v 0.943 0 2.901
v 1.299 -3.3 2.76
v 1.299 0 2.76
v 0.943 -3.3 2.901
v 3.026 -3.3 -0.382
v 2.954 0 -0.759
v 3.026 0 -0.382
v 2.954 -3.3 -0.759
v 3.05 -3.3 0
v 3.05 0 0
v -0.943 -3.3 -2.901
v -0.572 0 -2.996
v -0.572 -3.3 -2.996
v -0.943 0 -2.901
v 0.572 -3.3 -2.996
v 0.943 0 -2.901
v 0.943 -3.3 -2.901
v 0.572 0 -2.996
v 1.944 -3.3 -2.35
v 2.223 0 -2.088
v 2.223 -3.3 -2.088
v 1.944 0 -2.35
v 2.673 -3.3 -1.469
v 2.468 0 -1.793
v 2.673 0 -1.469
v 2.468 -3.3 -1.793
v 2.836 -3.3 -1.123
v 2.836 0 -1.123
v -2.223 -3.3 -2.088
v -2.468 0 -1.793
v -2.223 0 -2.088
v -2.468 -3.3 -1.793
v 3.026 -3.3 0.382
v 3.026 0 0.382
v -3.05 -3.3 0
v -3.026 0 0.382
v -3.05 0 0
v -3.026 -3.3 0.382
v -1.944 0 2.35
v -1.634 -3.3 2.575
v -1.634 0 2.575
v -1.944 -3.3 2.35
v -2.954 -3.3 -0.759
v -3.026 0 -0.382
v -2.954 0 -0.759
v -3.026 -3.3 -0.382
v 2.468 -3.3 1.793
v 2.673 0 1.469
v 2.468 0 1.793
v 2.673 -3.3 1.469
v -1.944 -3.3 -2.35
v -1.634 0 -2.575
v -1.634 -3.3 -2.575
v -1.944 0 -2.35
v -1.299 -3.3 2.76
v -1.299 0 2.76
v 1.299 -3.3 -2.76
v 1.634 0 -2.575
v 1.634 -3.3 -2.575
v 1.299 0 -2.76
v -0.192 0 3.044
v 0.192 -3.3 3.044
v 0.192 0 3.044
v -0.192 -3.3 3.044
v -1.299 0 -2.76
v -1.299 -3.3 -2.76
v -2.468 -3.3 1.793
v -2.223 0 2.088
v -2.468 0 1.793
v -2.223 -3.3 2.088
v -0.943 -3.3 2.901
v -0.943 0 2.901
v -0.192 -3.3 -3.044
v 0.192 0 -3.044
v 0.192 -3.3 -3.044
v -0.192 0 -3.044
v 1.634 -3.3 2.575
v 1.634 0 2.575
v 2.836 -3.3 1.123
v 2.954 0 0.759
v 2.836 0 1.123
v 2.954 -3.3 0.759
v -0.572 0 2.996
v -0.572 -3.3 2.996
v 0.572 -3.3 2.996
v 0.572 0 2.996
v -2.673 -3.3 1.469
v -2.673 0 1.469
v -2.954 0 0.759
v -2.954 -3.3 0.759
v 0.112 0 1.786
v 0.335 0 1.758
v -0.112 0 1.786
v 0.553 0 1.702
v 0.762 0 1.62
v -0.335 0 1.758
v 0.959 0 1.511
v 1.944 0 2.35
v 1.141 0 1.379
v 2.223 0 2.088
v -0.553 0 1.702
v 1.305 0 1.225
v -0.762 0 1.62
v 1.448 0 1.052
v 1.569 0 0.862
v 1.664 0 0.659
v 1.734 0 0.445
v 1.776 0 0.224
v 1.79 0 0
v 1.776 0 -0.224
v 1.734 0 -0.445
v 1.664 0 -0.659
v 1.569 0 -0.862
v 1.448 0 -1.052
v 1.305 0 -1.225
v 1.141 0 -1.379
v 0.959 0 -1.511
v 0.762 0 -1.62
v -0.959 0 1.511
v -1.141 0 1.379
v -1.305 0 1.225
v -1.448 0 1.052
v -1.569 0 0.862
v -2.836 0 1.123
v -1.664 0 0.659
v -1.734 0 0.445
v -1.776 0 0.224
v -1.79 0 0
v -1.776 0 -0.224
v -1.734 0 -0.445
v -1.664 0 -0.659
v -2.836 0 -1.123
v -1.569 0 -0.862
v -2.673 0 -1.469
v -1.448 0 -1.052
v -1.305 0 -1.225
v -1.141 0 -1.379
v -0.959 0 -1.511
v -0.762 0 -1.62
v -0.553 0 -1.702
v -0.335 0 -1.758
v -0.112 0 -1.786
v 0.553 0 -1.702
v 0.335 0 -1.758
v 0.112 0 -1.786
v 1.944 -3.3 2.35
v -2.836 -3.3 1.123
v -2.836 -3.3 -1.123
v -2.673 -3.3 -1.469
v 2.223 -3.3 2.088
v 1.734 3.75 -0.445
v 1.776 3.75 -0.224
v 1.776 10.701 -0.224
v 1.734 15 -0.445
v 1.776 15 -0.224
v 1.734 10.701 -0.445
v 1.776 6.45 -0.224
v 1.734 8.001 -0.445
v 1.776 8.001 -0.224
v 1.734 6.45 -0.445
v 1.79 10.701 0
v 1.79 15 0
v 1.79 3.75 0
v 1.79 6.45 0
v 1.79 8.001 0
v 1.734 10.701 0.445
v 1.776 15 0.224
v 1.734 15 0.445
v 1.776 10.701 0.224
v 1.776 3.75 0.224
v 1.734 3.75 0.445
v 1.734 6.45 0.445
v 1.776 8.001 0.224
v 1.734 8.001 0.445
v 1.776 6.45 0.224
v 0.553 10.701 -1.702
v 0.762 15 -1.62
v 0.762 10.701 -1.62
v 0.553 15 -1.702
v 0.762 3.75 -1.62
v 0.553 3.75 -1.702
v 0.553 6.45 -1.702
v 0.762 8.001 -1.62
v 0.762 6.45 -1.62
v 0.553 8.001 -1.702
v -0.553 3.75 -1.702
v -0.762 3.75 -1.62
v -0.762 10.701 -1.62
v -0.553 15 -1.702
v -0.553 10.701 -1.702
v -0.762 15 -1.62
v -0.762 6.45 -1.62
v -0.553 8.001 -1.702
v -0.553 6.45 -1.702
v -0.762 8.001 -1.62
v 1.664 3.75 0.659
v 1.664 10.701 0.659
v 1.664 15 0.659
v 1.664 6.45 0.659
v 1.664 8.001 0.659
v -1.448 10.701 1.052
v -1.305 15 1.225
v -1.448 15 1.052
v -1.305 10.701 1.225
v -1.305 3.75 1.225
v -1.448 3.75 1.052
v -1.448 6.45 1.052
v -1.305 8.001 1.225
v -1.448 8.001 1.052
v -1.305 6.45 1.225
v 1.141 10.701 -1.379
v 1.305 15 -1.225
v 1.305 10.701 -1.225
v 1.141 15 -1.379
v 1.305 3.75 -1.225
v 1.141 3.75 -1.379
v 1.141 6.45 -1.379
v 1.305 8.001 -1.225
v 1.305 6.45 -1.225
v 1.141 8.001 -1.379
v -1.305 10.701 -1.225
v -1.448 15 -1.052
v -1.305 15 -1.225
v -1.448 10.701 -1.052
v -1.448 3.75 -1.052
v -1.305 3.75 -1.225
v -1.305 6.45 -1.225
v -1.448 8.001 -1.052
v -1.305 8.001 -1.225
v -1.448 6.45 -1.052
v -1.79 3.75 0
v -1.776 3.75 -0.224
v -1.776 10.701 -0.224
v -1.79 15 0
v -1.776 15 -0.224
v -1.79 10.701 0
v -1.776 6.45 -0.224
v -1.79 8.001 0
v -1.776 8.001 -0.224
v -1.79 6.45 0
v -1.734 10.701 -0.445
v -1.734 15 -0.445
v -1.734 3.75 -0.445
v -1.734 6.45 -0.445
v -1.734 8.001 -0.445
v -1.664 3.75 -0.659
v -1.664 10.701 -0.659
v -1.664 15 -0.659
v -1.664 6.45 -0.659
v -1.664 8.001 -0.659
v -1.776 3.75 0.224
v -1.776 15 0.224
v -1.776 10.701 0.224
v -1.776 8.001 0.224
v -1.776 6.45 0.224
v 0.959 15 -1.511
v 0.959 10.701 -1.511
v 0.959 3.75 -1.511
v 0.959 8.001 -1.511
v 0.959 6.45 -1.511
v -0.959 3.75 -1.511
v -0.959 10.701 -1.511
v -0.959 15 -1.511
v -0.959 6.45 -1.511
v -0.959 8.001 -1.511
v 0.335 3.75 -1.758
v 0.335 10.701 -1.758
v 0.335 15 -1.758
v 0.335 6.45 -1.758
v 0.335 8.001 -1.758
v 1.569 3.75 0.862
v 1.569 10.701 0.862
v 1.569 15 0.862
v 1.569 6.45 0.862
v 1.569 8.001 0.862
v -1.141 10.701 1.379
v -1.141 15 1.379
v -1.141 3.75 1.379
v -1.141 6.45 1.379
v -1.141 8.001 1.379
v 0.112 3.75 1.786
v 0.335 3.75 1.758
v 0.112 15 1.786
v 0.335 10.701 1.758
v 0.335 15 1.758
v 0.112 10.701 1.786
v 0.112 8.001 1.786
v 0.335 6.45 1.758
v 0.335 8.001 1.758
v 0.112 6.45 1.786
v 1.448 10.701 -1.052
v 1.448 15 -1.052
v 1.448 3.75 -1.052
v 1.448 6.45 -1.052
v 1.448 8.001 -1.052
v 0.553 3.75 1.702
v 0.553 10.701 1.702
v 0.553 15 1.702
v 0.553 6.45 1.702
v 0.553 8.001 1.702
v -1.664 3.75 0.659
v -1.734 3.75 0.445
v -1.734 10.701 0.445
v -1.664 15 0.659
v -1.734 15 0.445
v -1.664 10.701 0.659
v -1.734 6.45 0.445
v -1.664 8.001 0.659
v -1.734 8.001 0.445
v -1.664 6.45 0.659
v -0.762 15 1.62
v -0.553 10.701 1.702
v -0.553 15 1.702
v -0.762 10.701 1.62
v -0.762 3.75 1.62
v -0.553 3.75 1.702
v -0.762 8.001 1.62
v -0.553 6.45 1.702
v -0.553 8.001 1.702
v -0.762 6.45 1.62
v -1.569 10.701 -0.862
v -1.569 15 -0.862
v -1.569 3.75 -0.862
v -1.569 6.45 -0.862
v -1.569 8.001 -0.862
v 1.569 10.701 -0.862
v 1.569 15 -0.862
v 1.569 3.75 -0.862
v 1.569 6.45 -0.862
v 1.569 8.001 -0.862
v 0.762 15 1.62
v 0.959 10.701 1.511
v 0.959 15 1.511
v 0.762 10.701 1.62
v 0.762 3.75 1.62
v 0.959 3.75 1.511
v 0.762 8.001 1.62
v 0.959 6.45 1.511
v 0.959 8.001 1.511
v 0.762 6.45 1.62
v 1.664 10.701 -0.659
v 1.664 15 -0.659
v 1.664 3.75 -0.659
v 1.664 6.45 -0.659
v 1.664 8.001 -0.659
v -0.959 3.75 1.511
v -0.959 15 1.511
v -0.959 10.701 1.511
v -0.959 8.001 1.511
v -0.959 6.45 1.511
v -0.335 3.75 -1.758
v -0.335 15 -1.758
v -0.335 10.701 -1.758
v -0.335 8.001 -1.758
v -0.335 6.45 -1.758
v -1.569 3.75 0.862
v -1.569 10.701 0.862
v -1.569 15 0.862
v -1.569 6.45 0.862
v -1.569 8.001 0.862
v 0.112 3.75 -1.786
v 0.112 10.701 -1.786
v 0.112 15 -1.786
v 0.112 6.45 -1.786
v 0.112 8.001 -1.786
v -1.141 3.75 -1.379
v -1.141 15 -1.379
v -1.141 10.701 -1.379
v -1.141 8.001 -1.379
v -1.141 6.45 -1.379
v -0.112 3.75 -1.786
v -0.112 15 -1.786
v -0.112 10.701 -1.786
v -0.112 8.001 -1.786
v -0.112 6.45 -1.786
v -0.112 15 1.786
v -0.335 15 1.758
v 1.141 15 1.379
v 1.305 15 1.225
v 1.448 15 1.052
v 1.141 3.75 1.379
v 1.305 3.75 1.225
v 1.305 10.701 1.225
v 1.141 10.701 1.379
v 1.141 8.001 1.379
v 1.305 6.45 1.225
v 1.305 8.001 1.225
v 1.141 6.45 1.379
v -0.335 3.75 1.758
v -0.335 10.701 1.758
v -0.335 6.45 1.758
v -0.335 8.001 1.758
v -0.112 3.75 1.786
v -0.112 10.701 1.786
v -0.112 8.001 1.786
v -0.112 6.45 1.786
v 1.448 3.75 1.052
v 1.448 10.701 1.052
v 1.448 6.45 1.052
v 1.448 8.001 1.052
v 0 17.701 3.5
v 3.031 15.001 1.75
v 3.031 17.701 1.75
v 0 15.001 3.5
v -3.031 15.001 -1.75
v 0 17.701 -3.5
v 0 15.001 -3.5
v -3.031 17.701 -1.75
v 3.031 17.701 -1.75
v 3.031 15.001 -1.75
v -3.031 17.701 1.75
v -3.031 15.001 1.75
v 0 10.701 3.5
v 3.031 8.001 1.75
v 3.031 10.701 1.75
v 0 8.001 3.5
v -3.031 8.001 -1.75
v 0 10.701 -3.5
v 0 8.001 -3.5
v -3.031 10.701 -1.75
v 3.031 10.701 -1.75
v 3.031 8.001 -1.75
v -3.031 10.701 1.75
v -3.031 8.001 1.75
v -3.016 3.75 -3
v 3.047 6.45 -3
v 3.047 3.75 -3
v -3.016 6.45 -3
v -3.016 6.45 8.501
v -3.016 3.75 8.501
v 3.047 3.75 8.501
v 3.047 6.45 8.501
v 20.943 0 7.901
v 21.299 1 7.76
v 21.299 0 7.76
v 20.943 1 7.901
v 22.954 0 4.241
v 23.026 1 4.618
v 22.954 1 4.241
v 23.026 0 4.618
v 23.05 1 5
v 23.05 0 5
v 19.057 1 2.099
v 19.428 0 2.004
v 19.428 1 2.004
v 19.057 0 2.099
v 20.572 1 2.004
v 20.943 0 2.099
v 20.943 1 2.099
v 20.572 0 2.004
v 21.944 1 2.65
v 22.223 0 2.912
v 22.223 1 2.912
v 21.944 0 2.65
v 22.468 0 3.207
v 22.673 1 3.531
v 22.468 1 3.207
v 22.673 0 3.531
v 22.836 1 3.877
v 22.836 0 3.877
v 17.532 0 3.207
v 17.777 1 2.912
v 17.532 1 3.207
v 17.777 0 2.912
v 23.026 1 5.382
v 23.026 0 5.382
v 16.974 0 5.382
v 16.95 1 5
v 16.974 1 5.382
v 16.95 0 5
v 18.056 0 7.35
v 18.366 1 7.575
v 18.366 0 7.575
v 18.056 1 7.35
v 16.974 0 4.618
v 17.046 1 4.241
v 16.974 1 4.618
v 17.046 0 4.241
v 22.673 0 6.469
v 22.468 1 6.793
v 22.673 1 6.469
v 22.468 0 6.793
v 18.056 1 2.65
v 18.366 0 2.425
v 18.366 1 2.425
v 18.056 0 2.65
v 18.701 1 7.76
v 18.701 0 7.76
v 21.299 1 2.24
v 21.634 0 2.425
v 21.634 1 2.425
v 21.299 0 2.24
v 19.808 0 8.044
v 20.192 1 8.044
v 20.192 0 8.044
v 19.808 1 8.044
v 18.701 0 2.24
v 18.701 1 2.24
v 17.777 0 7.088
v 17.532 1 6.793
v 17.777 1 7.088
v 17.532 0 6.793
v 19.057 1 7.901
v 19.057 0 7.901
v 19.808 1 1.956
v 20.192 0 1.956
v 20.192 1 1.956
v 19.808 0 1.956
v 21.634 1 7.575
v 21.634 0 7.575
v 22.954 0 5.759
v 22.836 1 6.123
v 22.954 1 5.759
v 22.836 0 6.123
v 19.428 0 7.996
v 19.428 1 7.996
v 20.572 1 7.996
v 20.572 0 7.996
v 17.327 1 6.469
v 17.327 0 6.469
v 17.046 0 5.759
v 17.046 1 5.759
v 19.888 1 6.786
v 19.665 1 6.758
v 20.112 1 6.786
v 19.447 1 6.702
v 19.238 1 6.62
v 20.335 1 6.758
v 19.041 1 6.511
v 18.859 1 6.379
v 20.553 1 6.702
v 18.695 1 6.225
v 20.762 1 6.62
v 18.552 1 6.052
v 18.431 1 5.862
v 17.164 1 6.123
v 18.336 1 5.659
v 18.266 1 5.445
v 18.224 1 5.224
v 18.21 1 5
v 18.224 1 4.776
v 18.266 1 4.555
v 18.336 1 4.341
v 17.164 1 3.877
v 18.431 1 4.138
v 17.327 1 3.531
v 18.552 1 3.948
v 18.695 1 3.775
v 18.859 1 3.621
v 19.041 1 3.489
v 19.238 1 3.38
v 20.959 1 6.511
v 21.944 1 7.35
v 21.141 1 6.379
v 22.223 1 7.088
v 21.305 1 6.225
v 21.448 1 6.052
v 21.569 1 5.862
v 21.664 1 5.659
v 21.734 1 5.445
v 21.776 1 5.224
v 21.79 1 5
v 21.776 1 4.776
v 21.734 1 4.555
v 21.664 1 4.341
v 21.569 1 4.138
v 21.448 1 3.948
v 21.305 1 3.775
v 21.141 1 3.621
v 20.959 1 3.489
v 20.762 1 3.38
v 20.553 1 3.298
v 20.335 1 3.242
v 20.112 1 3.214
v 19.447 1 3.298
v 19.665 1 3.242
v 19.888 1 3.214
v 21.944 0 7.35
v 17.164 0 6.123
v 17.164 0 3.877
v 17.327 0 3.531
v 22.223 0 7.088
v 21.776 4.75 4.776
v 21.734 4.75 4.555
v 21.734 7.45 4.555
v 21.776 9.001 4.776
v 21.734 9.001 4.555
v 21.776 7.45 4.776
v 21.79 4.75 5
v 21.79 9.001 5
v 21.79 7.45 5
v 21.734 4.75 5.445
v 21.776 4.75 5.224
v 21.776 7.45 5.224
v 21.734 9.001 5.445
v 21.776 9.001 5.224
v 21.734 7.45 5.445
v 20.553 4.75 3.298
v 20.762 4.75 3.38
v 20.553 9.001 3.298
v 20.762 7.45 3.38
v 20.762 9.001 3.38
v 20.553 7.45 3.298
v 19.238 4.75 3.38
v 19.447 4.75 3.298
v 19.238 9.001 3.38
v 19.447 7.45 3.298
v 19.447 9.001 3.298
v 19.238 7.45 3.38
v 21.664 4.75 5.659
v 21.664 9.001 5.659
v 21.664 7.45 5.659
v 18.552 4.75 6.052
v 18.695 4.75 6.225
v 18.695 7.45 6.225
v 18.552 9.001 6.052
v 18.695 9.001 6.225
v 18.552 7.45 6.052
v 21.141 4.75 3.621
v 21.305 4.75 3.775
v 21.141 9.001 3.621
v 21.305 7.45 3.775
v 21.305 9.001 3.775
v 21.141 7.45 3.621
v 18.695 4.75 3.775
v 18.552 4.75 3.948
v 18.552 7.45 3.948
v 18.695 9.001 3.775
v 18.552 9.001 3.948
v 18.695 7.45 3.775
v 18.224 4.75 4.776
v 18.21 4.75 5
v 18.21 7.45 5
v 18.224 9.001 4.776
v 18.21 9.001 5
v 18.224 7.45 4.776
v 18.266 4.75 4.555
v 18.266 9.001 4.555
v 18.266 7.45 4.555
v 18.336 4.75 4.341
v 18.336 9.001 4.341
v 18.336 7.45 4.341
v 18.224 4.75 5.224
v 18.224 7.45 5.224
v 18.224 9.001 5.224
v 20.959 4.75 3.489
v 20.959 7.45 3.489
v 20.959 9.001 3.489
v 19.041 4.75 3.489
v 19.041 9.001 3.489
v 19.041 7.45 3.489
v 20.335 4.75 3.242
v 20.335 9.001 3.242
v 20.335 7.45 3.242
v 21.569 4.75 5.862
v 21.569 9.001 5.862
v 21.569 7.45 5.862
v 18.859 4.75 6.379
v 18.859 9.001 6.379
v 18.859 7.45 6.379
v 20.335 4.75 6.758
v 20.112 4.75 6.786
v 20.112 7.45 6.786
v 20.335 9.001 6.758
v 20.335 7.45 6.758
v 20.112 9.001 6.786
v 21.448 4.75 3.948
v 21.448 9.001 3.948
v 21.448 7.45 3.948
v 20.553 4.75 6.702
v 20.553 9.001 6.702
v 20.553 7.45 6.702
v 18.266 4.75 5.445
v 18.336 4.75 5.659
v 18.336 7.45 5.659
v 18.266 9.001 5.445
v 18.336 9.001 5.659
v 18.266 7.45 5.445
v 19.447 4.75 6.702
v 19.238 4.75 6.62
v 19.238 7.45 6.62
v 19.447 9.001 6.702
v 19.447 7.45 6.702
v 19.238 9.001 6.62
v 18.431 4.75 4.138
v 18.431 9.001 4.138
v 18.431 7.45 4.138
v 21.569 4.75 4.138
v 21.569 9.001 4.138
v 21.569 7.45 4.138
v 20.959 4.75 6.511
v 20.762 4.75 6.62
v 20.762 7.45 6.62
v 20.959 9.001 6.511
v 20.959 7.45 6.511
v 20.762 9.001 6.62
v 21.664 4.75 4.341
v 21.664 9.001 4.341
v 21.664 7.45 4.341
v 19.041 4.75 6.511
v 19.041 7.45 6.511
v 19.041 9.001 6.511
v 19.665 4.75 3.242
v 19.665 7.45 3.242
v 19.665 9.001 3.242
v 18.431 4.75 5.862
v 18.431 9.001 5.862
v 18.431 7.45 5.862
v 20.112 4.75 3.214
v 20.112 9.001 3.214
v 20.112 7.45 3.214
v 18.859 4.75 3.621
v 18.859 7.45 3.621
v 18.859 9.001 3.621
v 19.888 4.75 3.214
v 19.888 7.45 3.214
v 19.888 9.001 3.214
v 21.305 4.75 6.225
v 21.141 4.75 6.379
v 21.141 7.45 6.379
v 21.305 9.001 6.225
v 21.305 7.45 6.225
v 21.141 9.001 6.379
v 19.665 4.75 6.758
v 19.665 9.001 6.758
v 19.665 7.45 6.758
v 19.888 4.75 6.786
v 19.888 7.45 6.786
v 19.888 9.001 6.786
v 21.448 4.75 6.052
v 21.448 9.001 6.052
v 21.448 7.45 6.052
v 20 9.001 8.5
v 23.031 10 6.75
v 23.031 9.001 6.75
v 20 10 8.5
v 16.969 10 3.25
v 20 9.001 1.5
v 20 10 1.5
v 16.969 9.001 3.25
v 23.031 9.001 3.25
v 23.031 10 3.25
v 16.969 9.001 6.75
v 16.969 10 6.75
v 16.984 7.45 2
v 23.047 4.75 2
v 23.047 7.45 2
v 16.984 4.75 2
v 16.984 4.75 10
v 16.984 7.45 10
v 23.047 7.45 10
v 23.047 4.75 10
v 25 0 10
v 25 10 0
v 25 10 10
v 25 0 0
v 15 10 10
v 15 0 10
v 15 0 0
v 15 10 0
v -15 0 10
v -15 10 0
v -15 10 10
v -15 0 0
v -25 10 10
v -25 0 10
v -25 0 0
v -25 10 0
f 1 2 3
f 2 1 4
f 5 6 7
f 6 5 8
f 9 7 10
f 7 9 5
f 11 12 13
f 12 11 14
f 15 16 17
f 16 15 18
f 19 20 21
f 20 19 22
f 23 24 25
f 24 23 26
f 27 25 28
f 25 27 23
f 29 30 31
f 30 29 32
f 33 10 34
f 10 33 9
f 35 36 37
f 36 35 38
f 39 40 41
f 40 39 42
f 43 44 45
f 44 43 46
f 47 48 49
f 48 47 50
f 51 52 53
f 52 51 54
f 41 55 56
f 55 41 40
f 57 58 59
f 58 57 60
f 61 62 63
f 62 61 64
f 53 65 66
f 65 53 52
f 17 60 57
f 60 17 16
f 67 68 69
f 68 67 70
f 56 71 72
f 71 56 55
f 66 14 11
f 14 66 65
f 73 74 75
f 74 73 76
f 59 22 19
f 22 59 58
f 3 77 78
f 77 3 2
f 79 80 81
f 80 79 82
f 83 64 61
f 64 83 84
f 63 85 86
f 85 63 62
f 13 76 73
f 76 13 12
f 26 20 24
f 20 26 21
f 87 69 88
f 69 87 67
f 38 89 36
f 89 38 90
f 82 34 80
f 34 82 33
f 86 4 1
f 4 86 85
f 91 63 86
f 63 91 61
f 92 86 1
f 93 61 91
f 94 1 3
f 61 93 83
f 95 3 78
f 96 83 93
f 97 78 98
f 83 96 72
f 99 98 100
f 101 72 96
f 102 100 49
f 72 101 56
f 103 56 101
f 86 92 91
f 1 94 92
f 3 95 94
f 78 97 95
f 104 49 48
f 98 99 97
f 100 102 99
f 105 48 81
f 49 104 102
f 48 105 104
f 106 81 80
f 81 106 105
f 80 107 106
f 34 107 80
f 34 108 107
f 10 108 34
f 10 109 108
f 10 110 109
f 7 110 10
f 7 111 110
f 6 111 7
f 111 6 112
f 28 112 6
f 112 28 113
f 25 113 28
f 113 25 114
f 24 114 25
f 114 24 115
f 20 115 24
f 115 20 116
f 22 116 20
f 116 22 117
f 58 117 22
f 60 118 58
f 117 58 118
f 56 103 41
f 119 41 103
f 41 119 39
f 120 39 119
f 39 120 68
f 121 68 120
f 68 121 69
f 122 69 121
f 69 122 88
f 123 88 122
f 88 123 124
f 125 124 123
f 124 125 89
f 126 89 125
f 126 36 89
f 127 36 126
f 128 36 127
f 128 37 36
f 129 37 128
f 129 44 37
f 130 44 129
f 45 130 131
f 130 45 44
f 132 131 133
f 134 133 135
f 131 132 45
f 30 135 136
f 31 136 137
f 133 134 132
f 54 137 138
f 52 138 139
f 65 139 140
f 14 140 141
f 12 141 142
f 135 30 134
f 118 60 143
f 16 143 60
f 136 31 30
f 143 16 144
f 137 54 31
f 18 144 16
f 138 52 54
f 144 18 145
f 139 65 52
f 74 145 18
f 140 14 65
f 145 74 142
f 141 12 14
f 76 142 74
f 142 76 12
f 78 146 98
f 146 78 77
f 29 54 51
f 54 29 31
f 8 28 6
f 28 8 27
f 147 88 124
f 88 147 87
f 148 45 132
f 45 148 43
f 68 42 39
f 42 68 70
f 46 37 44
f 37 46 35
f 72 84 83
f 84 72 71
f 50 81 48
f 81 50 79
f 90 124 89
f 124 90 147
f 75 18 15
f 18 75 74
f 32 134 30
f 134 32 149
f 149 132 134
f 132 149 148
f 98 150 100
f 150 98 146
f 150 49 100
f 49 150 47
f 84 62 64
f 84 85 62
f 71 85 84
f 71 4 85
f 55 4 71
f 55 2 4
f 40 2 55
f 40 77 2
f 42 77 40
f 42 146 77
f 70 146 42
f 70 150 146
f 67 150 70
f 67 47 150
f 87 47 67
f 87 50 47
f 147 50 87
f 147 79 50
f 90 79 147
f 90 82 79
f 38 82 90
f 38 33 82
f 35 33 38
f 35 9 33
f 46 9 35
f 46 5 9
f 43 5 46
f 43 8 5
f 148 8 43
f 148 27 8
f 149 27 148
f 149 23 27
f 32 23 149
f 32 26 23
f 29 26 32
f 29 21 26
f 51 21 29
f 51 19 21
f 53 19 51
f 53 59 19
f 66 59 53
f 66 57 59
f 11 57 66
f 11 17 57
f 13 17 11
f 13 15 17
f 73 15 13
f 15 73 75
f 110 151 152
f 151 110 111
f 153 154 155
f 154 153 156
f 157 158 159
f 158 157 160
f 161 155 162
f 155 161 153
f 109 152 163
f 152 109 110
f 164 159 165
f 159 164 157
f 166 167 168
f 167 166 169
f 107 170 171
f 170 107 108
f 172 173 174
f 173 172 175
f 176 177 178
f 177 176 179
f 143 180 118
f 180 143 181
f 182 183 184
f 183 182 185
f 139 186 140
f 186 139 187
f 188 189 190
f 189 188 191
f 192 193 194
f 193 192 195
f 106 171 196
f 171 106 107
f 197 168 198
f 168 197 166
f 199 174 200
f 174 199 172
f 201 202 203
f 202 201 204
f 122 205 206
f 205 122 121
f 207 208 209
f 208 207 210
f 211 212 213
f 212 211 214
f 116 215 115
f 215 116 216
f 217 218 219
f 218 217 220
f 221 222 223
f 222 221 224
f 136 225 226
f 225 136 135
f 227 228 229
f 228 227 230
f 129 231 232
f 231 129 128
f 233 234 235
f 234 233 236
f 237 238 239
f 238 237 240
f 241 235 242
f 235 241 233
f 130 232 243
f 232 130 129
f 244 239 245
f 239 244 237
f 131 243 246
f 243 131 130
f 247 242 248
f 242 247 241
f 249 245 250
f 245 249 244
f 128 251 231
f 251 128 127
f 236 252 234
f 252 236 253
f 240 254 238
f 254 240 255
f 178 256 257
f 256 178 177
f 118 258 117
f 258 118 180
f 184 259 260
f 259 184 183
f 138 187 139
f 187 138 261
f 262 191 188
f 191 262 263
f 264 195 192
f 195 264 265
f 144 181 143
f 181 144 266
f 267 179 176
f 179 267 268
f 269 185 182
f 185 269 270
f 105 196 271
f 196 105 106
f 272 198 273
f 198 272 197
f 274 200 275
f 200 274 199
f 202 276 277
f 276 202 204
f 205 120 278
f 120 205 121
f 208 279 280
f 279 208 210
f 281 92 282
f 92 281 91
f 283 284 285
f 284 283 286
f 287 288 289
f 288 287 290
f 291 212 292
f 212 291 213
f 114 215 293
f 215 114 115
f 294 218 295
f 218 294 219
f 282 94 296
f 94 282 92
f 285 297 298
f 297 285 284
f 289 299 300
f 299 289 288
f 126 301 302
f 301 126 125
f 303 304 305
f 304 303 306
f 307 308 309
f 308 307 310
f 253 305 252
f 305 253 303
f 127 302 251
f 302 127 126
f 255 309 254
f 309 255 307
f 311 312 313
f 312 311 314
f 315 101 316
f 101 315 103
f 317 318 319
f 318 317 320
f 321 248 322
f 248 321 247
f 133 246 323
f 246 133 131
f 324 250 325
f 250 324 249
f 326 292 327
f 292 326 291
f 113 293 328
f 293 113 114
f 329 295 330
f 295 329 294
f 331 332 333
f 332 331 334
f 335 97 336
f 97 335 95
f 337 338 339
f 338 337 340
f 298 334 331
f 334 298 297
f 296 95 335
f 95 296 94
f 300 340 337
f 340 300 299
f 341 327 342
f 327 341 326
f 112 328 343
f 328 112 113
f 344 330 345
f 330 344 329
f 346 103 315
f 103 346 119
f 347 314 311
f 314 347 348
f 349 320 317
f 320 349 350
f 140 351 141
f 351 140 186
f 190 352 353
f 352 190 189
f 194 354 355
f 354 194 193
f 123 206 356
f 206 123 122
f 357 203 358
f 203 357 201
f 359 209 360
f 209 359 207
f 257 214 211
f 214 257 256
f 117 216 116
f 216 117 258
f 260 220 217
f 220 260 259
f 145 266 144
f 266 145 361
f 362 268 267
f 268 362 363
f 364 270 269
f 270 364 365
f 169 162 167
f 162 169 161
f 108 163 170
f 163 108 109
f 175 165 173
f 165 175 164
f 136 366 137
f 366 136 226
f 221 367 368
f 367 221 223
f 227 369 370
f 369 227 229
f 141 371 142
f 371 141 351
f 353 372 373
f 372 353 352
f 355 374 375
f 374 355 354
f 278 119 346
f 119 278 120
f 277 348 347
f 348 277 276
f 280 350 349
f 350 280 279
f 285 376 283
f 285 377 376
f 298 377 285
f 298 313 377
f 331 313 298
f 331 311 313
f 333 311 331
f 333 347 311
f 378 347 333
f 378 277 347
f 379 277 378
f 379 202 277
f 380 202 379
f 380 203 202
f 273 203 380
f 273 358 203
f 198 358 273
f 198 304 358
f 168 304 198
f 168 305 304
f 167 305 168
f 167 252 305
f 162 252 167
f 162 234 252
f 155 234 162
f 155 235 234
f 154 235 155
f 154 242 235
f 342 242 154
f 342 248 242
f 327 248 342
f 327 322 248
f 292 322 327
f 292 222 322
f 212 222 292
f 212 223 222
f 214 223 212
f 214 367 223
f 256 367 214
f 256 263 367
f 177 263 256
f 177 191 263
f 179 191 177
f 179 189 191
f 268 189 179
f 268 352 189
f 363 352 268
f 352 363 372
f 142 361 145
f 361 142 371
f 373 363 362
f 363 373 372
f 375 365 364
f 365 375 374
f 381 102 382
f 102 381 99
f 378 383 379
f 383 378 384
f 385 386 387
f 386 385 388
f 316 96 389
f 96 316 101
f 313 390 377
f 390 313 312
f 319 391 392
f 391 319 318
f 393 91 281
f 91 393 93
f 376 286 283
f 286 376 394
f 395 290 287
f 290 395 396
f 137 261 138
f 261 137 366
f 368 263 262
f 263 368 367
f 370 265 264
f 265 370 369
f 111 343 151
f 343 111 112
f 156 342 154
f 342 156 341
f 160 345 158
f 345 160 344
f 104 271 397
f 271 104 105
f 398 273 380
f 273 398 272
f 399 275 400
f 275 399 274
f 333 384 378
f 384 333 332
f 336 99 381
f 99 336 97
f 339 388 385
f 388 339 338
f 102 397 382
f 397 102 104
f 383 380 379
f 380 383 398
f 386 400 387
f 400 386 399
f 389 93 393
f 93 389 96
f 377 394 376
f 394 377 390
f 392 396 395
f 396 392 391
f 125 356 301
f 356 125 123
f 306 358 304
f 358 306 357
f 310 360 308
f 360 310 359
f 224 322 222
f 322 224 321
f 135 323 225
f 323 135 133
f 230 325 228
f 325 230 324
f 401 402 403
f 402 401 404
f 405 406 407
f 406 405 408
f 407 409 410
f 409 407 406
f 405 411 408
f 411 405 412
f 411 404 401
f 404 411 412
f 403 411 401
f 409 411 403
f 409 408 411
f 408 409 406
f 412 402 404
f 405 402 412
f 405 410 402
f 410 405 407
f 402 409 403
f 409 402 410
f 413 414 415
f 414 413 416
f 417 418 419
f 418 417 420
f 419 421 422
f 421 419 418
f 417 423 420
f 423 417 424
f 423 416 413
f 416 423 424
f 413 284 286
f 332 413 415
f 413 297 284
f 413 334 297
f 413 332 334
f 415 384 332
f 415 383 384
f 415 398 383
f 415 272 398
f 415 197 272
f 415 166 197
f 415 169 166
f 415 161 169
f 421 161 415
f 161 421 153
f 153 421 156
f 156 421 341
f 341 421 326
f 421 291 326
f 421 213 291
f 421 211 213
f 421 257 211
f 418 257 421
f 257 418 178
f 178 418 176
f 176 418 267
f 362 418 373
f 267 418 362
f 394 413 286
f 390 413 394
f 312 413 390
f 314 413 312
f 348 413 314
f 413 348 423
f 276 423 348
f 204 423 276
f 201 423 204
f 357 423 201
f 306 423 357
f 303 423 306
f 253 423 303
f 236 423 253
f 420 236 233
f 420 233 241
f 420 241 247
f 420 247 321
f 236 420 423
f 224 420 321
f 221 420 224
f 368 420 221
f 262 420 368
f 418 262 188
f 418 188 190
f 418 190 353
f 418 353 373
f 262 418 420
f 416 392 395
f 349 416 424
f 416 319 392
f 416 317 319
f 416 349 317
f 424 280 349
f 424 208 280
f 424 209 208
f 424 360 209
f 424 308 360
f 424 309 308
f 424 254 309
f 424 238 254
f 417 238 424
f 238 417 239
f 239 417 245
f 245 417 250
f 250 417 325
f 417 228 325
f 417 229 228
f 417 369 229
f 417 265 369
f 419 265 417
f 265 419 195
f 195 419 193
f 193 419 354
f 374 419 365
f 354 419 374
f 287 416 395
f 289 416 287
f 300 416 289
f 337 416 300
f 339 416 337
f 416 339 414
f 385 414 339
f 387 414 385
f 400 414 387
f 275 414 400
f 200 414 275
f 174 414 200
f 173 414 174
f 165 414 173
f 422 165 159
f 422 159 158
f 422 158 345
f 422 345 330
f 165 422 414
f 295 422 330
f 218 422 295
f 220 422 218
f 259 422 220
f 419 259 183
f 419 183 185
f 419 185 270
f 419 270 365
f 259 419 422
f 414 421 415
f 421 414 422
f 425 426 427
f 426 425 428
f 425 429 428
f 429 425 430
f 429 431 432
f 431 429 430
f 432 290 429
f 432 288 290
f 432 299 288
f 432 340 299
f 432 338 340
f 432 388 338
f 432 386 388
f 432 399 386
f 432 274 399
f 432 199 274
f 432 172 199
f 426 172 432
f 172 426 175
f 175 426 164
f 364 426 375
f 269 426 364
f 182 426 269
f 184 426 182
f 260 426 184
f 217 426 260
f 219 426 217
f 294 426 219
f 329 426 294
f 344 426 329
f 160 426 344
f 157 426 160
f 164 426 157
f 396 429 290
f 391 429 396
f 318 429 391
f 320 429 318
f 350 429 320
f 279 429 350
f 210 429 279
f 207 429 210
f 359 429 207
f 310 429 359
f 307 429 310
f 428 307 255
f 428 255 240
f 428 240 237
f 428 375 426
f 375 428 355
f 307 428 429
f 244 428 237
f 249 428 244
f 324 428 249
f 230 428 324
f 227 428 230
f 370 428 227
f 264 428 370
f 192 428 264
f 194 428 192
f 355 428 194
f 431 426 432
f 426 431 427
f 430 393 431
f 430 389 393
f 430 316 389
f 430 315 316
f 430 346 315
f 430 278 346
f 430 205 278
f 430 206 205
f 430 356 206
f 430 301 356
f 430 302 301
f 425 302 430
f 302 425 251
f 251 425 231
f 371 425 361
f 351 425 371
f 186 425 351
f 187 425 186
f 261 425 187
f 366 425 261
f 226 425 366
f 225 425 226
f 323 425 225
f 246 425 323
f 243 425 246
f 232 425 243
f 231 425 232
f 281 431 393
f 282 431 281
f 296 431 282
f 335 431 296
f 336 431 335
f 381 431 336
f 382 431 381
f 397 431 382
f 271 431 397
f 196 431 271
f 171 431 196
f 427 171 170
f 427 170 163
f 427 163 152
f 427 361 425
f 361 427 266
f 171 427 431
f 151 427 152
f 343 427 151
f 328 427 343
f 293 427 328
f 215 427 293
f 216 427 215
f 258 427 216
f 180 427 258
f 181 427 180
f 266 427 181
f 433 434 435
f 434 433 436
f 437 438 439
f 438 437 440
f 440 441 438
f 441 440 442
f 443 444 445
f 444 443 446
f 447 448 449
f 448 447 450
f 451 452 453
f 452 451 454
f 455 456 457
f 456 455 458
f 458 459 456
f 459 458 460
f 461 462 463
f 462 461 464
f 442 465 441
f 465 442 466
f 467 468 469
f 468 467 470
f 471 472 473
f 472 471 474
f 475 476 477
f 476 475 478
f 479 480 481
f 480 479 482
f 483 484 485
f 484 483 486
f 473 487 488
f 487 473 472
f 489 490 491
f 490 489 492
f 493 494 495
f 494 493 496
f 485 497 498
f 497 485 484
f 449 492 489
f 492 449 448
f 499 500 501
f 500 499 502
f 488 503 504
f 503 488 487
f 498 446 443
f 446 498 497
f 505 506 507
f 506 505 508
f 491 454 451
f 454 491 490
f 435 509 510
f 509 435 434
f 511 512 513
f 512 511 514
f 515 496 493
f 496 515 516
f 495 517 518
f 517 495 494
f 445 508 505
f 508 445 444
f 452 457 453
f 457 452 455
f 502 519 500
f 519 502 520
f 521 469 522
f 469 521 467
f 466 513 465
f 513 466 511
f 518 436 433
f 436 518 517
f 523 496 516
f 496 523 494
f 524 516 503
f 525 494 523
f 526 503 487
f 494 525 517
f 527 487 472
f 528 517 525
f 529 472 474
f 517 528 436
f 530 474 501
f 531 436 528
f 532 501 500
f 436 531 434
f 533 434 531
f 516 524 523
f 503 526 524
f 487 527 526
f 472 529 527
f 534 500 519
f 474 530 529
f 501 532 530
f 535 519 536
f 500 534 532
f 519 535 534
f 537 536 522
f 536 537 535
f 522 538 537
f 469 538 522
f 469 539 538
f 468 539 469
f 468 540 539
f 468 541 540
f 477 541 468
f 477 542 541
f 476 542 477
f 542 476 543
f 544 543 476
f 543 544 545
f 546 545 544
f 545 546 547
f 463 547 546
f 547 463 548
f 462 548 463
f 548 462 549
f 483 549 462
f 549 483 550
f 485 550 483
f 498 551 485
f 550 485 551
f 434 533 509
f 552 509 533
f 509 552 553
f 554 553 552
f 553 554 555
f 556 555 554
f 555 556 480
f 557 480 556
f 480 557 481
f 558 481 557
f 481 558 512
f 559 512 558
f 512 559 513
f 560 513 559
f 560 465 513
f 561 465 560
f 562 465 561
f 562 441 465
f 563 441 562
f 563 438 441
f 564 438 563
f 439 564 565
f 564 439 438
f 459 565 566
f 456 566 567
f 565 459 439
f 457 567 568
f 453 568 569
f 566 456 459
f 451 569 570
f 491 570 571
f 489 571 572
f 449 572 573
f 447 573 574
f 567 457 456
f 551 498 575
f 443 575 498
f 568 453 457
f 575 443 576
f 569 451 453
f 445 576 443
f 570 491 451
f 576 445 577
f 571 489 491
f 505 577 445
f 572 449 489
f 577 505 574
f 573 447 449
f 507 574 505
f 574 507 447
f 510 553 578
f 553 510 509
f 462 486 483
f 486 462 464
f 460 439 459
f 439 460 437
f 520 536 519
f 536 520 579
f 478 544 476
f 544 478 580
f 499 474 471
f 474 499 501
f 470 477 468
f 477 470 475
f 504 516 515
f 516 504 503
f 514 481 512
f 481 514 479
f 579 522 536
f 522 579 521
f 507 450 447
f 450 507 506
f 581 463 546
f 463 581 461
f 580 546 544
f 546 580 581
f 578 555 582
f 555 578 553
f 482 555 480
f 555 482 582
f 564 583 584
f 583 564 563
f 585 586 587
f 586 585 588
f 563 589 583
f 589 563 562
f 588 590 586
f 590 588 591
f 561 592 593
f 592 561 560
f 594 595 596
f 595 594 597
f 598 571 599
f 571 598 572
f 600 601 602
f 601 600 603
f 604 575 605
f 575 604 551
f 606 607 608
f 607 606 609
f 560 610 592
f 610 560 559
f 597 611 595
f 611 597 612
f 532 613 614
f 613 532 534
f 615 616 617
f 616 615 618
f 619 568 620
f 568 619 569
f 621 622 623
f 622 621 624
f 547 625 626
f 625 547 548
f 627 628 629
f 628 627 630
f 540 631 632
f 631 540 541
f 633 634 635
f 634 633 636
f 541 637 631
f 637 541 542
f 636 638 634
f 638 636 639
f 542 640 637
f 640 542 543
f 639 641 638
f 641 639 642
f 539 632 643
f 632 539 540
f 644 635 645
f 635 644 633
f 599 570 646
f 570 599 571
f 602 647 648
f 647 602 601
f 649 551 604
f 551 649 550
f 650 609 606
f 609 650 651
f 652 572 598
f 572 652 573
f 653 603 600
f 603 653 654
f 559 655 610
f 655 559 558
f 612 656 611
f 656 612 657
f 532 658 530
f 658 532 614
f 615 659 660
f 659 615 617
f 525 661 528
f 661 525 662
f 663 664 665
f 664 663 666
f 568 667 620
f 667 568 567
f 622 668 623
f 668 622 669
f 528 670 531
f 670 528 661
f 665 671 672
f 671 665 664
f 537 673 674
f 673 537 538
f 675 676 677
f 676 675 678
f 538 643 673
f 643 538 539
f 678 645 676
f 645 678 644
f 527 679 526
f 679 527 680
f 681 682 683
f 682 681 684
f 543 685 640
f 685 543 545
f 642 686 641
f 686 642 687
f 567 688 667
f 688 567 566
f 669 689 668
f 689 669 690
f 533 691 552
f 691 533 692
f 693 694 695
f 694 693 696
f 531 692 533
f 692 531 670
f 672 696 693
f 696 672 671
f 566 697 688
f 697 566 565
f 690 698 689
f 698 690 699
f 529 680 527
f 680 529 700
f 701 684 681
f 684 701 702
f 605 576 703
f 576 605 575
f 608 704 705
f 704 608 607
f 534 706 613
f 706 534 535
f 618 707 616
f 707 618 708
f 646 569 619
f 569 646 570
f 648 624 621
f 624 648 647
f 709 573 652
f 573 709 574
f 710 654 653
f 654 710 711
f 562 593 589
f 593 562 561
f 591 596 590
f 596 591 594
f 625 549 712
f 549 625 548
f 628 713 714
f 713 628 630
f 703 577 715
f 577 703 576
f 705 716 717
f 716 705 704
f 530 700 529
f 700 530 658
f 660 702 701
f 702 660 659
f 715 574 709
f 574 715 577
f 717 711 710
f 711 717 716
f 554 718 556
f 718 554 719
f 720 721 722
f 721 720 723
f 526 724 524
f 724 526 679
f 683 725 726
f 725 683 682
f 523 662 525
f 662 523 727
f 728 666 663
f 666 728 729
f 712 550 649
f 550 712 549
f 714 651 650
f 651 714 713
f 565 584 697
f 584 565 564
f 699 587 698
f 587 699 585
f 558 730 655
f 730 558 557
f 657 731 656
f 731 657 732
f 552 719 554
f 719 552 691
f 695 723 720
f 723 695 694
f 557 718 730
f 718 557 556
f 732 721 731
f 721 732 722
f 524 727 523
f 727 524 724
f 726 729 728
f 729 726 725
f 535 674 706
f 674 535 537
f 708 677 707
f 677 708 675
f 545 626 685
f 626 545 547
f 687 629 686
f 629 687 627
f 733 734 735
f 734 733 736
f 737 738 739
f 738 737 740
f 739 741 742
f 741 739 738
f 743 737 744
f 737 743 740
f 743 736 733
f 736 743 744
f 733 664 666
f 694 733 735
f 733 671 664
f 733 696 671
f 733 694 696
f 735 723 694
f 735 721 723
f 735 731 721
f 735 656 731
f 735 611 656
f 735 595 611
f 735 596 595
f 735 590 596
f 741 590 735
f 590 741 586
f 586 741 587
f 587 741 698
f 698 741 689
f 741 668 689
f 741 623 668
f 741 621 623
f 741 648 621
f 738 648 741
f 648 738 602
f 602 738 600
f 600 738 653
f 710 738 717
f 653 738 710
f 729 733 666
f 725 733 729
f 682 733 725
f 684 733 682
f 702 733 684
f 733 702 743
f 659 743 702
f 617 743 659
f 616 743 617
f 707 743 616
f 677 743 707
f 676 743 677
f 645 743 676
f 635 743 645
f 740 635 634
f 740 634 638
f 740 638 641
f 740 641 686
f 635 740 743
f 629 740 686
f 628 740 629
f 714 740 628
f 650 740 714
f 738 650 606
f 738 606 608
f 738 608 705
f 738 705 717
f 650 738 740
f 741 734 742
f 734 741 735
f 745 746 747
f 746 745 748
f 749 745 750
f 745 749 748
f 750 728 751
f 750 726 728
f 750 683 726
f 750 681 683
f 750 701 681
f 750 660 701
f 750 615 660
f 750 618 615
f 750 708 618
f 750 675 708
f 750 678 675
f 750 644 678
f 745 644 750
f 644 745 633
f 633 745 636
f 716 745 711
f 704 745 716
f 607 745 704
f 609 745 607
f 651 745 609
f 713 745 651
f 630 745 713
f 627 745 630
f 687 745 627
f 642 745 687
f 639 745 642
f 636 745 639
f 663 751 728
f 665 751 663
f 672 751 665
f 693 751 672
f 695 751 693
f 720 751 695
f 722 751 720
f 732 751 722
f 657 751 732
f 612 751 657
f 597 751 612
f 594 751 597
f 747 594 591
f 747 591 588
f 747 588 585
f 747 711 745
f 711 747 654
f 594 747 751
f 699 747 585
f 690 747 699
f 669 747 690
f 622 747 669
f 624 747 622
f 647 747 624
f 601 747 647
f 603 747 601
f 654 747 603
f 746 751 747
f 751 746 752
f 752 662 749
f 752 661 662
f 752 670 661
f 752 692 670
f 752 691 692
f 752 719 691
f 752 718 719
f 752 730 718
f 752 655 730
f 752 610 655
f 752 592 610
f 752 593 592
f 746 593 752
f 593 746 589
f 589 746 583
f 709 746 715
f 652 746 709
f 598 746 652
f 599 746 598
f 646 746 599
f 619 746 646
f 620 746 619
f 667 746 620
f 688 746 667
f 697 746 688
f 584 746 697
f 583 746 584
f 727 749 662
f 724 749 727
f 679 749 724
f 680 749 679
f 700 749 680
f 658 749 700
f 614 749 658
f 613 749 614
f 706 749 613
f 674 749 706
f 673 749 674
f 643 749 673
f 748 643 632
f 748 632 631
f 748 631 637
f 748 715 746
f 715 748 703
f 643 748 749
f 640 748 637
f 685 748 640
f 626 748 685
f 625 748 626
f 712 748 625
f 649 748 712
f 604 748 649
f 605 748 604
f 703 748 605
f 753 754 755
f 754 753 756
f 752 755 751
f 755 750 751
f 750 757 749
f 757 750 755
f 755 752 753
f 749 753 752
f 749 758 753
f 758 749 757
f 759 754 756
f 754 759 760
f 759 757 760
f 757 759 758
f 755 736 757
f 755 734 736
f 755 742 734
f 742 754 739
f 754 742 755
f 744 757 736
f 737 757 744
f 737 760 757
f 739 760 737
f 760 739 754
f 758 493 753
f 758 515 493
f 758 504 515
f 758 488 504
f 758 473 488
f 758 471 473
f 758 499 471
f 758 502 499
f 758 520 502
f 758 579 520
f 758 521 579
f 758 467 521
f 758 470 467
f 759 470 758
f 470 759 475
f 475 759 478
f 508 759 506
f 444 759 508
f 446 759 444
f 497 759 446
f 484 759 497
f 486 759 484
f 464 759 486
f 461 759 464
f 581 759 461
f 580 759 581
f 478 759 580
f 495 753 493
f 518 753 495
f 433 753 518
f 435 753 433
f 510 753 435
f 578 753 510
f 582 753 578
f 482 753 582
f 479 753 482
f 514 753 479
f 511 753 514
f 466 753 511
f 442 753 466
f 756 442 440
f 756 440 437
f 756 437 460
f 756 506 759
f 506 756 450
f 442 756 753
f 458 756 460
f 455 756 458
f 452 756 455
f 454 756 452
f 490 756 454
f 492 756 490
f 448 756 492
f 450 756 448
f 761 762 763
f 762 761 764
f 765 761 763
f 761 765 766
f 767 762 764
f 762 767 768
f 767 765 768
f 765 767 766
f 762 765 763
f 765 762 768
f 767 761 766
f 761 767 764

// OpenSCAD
 // MCAD_nuthole_demo.scad
 
// This demos MCAD/nuts_and_bolts/nuthole() using the MCAD library

// Note that the nut-trap type nuthole is across the 
// points rather than flats w/o the roate([0,30,0]) trick. 
// MCAD nut traps are awkward.

 
 // install libraries locally per https://en.wikibooks.org/wiki/OpenSCAD_User_Manual/Libraries
 // or depend on Thingiverse's customizer's builtin MCAD
 use <MCAD/nuts_and_bolts.scad> // https://github.com/openscad/MCAD
 include <MCAD/units.scad>  // defines constants https://github.com/openscad/MCAD/blob/master/units.scad
 
  use <MCAD/nuts_and_bolts.scad>
 include <MCAD/units.scad>; // 
 
 use <MCAD/polyholes.scad>
 

 
 // size
 size = 3; // 
 
 // part size
 part_edge = 10;
 
 // 
 
tiny = 0.001; // for clean intersections
 
 // facet number for rendering
 $fn=50;
 
 nuthole_demo();
 
 module nuthole_demo(){
     translate([-20,0,0])
         nuthole_demo_part(part_edge);
         
     translate([0,0,0])
         nuthole_holes(size=size);
         
     translate([20,0,0])
         difference(){
             nuthole_demo_part(part_edge);
             translate([0,1,part_edge/2])nuthole_holes(size=size);
     }
 }
 
module nuthole_demo_part(size=10){
    translate([-size/2,0,0])
        cube([size,size,size],center=false);
}



module nuthole_holes(size=3,length=part_edge+5,tall=part_edge){
   // translate([10/2,0,10/2]) // position hole
    my_nutbolttrap_default(size=size,length=length,depth=length/4,tall=tall);
}

module my_nutbolttrap_default(size,length,depth,tall){
    union(){
        translate([0*size/2,0,0])rotate([-90,0,0])
            boltHole(size, length= length, tolerance=0.3, proj=-1);  
        translate([0,length+tiny,0])rotate([-90,30,0])nutHole(size, tolerance=0.3);
        translate([0,length-5-2+tiny,0])rotate([-90,30,0])nutHole(size, tolerance=0.3);
        translate([0,depth,-size])
            linear_extrude(height=tall+size/2+tiny)   
                translate([-size/2,0,5.5/2])rotate([0,30,0])nutHole(size, proj=2, tolerance=0.3);
    }

}
 
//translate([-40,0,0])SKIPtestNutsAndBolts();
//translate([-45,10,0])boltHole(3, length= 30, proj=2);

//translate([-50,0,0])linear_extrude(10)nutHole(size, proj=-1); // nope - cant extrude 3d objects


 module testNutsAndBolts()
{
	$fn = 360;
	translate([0,15])nutHole(3, proj=2);
	boltHole(3, length= 30, proj=2);

}
